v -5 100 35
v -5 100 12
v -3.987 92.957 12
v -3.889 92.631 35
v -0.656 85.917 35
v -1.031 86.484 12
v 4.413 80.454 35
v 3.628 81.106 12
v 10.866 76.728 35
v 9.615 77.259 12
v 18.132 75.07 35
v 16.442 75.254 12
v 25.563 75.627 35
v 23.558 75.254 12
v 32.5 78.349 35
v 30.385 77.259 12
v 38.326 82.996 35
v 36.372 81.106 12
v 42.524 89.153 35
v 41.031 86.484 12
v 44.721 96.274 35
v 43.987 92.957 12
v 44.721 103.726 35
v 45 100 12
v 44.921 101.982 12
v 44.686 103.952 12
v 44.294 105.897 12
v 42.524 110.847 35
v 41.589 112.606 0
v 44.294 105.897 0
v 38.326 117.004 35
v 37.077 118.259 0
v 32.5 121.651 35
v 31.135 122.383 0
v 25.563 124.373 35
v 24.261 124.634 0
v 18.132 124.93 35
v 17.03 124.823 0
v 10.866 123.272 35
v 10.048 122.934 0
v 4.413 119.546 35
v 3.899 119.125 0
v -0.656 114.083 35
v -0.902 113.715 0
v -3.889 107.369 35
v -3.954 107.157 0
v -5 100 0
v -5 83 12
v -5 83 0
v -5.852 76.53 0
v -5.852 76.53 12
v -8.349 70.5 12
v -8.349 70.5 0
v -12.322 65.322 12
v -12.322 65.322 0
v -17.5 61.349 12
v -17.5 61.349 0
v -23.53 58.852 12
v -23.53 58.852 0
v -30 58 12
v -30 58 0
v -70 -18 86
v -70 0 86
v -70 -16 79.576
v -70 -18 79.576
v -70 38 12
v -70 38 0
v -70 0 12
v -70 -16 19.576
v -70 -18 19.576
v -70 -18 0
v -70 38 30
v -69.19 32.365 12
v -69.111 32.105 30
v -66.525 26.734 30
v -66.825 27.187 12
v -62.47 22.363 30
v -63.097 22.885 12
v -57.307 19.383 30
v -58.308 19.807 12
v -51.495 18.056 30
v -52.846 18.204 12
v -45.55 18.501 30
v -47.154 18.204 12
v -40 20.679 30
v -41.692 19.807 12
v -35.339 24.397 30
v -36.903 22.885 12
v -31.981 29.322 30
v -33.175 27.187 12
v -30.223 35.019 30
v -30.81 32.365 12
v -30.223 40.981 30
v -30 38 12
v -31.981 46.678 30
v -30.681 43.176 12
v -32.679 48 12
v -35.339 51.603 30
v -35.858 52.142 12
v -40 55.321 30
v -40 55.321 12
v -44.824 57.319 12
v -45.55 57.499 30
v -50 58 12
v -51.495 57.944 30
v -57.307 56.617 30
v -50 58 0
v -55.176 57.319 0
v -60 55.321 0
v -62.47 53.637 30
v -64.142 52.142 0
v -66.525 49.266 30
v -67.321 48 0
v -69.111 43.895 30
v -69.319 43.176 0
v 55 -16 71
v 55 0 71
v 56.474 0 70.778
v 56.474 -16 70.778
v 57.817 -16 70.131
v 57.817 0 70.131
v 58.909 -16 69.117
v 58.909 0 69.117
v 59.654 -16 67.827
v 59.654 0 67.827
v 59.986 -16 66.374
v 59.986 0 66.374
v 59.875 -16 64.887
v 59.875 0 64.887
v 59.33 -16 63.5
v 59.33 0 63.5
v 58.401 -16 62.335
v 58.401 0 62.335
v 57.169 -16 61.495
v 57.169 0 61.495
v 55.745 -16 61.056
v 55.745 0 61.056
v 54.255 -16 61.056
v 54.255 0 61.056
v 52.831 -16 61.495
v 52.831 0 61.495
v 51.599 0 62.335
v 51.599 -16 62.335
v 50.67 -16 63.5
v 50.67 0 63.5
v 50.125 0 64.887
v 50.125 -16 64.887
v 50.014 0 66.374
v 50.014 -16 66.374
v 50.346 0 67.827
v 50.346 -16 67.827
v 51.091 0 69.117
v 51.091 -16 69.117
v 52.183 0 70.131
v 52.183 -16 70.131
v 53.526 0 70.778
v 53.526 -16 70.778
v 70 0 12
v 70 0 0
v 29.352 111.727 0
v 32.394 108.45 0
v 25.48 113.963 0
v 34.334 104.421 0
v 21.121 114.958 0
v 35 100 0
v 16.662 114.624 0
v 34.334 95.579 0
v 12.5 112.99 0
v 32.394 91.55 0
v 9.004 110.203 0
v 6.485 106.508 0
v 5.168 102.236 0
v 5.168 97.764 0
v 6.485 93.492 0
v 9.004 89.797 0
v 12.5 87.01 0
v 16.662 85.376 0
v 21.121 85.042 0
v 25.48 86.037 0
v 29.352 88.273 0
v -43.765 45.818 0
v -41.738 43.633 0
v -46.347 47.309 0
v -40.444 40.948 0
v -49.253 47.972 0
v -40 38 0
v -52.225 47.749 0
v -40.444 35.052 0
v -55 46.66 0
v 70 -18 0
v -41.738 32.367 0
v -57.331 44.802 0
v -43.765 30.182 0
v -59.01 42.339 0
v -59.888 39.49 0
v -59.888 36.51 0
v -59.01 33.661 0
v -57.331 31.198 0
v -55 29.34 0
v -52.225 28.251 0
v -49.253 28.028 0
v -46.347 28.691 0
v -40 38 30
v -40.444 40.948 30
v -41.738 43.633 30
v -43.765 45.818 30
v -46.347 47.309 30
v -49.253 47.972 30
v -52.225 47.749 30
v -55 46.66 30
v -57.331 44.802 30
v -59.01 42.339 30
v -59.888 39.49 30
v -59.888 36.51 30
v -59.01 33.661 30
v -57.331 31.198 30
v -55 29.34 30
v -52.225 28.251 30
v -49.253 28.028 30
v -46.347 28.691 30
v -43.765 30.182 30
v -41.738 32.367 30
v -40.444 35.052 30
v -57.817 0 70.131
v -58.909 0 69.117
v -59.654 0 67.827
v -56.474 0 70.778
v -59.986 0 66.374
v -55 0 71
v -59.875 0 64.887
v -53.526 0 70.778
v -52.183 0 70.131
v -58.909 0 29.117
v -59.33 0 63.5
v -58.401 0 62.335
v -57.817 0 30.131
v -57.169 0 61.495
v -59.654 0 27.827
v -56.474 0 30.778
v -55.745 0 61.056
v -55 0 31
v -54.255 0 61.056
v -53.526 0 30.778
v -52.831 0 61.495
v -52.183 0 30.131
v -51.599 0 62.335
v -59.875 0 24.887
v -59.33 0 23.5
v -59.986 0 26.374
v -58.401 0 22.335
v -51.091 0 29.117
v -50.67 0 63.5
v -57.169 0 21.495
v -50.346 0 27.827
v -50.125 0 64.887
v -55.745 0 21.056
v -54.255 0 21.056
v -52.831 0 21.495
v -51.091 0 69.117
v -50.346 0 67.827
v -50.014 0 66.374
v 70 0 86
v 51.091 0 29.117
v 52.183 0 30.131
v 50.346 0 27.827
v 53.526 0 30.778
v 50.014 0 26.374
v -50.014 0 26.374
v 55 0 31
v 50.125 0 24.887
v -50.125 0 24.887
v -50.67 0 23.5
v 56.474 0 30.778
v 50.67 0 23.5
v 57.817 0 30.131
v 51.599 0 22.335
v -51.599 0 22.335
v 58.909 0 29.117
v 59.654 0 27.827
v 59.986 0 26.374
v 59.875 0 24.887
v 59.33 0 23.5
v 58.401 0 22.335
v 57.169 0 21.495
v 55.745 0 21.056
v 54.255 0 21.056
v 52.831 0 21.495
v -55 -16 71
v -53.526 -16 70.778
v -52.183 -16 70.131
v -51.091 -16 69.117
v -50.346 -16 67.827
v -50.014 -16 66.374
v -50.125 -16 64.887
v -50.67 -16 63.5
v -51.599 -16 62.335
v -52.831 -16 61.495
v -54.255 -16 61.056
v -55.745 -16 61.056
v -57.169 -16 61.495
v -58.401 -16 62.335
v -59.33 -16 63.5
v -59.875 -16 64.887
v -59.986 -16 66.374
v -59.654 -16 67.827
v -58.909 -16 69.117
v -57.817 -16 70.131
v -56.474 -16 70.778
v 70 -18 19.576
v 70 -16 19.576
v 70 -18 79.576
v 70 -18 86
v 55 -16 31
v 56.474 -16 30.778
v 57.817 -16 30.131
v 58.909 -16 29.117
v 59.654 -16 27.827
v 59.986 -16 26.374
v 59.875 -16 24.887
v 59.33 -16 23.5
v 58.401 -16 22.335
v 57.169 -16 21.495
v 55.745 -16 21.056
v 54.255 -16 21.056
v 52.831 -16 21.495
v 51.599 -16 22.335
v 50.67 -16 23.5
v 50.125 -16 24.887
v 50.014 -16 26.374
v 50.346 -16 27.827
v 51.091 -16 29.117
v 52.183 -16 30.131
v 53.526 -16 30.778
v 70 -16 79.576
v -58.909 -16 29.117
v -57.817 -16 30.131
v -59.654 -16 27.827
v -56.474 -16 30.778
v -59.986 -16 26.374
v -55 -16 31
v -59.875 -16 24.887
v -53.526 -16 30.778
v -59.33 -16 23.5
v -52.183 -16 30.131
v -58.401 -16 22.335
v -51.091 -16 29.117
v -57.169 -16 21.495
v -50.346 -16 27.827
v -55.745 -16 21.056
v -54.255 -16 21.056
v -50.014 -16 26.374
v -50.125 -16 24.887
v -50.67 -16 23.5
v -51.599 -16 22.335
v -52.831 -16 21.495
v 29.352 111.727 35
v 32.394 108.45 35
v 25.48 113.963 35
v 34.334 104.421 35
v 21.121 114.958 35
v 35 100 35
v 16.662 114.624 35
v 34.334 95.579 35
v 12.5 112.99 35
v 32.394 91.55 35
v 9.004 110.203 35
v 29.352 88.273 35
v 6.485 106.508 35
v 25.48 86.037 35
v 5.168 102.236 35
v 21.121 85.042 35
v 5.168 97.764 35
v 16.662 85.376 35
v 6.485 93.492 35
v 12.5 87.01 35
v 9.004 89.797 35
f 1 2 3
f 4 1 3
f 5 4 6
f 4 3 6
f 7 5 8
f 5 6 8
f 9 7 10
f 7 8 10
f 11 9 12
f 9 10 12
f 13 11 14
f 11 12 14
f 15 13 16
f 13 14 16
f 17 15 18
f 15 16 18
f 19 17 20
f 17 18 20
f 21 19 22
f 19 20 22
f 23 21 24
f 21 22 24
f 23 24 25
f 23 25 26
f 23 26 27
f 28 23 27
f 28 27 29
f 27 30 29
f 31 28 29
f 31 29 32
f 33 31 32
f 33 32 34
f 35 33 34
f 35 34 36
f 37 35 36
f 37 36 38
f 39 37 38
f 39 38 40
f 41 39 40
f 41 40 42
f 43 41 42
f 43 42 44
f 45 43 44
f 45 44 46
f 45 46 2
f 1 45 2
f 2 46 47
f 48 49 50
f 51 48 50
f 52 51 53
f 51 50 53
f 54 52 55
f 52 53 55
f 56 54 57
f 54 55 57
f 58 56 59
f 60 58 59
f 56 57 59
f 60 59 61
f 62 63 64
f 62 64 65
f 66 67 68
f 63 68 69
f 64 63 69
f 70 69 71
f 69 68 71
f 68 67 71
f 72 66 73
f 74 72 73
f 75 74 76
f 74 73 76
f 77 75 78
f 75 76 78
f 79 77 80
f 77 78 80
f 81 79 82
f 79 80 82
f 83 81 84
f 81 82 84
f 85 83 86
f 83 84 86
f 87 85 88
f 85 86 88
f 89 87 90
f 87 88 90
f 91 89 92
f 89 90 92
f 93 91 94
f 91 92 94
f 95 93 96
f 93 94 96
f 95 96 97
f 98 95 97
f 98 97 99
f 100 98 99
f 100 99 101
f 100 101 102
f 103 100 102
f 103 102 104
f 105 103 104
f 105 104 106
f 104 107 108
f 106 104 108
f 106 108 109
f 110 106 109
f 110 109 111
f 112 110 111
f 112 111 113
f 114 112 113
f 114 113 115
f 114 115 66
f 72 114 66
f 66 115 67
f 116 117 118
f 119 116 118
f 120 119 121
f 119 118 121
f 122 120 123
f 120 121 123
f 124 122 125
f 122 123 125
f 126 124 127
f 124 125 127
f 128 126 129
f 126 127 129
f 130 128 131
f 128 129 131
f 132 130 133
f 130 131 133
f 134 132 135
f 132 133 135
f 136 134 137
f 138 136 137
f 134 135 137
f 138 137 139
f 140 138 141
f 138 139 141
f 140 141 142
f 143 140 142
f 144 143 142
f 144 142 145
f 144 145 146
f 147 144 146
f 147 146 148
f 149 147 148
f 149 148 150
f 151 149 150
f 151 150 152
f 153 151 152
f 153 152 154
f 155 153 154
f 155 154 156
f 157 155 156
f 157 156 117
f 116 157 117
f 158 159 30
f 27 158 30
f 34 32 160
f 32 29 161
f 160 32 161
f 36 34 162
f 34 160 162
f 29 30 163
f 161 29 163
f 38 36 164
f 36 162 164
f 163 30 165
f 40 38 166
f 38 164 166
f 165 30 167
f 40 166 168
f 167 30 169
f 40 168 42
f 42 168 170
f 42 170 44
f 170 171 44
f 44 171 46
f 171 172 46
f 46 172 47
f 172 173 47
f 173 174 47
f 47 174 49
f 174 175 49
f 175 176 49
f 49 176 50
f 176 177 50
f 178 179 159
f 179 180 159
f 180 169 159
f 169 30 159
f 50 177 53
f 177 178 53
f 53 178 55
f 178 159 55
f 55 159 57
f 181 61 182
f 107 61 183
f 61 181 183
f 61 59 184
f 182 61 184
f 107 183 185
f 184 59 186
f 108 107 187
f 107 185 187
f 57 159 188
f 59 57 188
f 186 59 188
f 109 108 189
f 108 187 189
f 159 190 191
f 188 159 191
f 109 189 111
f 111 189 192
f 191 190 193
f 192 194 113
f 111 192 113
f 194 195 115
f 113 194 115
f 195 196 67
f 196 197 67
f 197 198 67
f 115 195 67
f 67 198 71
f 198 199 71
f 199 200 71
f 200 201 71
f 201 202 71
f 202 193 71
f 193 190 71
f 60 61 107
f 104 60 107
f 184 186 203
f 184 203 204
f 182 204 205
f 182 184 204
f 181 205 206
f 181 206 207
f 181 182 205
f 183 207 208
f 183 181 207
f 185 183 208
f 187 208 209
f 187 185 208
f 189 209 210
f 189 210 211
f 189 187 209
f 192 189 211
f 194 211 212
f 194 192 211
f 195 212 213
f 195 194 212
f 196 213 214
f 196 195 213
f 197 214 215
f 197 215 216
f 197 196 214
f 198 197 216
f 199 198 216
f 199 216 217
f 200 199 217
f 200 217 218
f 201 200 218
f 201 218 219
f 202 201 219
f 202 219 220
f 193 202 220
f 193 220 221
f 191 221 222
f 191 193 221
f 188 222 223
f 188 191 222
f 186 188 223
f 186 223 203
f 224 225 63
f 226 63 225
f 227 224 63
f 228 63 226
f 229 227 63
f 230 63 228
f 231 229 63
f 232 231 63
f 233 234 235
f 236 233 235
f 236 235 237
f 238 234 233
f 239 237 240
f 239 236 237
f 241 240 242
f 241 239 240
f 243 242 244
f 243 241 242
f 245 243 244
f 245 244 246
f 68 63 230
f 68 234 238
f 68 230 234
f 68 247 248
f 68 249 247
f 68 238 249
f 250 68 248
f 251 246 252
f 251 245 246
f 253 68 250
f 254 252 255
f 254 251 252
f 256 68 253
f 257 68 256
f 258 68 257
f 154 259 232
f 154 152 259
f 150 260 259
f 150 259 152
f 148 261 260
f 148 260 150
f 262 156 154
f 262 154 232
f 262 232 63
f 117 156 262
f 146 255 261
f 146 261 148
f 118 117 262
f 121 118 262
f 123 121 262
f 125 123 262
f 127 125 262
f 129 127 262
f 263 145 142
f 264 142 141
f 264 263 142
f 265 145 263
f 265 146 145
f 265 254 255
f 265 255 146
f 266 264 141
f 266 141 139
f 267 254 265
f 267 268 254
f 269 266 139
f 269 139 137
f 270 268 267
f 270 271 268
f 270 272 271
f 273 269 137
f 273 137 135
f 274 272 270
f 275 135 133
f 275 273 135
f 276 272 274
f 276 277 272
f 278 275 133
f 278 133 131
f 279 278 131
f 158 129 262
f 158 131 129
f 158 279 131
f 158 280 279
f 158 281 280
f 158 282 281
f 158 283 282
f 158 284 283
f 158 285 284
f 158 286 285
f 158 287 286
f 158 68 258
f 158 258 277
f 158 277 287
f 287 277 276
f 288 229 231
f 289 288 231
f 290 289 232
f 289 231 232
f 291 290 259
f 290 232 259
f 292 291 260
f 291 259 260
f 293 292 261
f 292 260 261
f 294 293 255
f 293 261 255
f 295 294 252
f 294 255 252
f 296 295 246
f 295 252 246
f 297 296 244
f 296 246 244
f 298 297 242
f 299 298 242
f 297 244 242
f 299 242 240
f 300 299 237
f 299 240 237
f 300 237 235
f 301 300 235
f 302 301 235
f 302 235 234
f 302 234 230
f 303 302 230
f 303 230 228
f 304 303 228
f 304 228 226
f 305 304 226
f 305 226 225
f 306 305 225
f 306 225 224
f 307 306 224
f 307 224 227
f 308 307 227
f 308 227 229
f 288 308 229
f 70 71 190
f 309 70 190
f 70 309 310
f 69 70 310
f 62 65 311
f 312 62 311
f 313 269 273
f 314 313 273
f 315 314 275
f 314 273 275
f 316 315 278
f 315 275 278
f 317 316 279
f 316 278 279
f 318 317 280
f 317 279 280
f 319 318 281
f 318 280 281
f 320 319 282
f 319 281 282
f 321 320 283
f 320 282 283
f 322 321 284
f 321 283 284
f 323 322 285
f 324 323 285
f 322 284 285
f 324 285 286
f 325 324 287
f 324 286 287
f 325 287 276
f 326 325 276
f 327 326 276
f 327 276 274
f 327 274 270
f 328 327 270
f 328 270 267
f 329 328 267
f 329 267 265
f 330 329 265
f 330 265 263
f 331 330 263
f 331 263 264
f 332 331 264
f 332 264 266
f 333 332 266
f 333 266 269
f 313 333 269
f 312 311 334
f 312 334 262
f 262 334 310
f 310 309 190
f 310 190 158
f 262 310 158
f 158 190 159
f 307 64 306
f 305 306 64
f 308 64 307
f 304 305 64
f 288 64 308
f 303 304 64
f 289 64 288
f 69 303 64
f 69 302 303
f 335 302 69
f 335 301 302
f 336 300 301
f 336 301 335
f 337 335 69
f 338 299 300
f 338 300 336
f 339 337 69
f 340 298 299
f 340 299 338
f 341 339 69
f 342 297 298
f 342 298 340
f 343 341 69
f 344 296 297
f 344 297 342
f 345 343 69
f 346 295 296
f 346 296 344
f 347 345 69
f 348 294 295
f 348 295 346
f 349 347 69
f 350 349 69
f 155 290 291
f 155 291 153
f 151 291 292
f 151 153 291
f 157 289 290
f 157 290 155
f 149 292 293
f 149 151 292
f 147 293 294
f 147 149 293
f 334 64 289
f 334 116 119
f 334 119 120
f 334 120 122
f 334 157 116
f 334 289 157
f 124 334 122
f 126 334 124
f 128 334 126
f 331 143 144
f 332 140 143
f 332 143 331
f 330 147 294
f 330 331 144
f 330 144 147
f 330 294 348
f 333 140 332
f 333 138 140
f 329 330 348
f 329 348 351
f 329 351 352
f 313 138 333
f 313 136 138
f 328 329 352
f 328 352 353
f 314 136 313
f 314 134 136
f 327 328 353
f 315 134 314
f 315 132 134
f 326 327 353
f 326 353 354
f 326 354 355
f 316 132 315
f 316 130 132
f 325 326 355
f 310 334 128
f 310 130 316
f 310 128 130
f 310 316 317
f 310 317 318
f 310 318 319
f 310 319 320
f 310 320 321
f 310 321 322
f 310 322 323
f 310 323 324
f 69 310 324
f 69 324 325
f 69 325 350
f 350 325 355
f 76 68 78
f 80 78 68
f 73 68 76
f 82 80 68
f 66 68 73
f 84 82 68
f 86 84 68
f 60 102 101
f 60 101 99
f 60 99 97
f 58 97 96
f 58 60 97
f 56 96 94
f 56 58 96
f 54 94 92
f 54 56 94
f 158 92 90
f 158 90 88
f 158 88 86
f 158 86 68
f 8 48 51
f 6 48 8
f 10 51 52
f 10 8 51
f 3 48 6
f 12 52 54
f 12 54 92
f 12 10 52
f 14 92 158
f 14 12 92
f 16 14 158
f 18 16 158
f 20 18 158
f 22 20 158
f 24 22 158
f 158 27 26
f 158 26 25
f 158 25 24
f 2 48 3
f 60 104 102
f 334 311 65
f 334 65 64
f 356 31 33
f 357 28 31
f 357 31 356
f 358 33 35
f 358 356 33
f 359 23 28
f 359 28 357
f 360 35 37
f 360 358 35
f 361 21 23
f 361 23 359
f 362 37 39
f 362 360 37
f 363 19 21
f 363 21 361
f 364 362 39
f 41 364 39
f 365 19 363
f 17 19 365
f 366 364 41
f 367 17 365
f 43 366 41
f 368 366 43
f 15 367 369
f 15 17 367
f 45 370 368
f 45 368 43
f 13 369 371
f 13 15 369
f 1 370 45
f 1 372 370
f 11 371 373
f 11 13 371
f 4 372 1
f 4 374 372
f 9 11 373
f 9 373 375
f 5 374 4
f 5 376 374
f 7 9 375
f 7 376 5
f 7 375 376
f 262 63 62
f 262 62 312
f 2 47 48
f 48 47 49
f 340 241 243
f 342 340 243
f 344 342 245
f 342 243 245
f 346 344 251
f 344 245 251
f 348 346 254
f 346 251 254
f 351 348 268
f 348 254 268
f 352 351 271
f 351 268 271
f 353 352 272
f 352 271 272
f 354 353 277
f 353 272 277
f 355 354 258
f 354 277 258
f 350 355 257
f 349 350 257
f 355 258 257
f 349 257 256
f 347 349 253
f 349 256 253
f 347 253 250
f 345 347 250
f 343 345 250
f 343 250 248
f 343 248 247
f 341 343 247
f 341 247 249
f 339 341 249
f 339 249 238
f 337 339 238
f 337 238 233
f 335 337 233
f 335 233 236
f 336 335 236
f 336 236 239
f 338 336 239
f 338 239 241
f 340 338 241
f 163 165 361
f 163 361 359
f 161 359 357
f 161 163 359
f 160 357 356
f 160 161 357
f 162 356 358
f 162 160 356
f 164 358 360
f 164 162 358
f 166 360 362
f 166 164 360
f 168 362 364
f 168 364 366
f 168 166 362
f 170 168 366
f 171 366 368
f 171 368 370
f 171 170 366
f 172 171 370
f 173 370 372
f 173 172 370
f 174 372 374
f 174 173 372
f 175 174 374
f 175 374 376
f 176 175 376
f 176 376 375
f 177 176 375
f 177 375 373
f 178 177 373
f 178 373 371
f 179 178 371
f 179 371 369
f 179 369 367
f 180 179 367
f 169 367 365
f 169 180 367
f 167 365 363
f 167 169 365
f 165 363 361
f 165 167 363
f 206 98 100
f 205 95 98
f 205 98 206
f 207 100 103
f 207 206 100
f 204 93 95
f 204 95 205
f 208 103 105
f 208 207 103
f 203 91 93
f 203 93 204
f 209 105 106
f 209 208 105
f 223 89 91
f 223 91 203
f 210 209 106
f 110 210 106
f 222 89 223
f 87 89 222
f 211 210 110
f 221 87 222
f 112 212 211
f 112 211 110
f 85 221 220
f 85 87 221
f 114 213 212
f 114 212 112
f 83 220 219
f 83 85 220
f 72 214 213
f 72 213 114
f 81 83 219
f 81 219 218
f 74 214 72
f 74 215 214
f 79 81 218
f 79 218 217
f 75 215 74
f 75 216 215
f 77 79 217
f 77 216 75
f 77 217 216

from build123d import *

# Parameters (mm, degrees)
SKETCH4_W           = 140
SKETCH4_H           = 18
BOSS_EXTRUDE1_DEPTH = 86
BOSS_EXTRUDE3_DEPTH = 12
SKETCH6_5_R         = 15
BOSS_EXTRUDE4_DEPTH = 35
SKETCH6_6_R         = 10
BOSS_EXTRUDE5_DEPTH = 30
SKETCH11_R          = 5
CUT_EXTRUDE1_DEPTH  = 168.095780916
SKETCH12_W          = 60
SKETCH12_H          = 16.179667724
CUT_EXTRUDE2_DEPTH  = 207.448540804


with BuildPart() as part:
    # Sketch4 → Boss-Extrude1 (new body)
    with BuildSketch(Plane.XY):
        with Locations((0, -9)):
            Rectangle(SKETCH4_W, SKETCH4_H)
    extrude(amount=BOSS_EXTRUDE1_DEPTH)

    # Sketch6 → Boss-Extrude3 (add)
    with BuildSketch(Plane.XY):
        with BuildLine():
            Line((-70, 38), (-70, 0))
            Line((-70, 0), (70, 0))
            Line((70, 0), (44.294494718, 105.897247359))
            ThreePointArc((44.294494718, 105.897247359), (44.822997079, 102.969649142), (45, 100))
            ThreePointArc((45, 100), (20, 75), (-5, 100))
            Line((-5, 100), (-5, 83))
            ThreePointArc((-5, 83), (-12.32233047, 65.32233047), (-30, 58))
            Line((-30, 58), (-50, 58))
            ThreePointArc((-50, 58), (-35.857864376, 52.142135624), (-30, 38))
            ThreePointArc((-30, 38), (-50, 18), (-70, 38))
        make_face()
    extrude(amount=BOSS_EXTRUDE3_DEPTH)

    # Sketch6<5> → Boss-Extrude4 (add)
    with BuildSketch(Plane.XY):
        with BuildLine():
            ThreePointArc((45, 100), (44.822997079, 102.969649142), (44.294494718, 105.897247359))
            ThreePointArc((44.294494718, 105.897247359), (17.030350858, 124.822997079), (-5, 100))
            ThreePointArc((-5, 100), (20, 75), (45, 100))
        make_face()
        with Locations((20, 100)):
            Circle(SKETCH6_5_R, mode=Mode.SUBTRACT)
    extrude(amount=BOSS_EXTRUDE4_DEPTH)

    # Sketch6<6> → Boss-Extrude5 (add)
    with BuildSketch(Plane.XY):
        with BuildLine():
            ThreePointArc((-50, 58), (-64.142135624, 52.142135624), (-70, 38))
            ThreePointArc((-70, 38), (-50, 18), (-30, 38))
            ThreePointArc((-30, 38), (-35.857864376, 52.142135624), (-50, 58))
        make_face()
        with Locations((-50, 38)):
            Circle(SKETCH6_6_R, mode=Mode.SUBTRACT)
    extrude(amount=BOSS_EXTRUDE5_DEPTH)

    # Sketch11 → Cut-Extrude1 (cut, through all)
    with BuildSketch(Plane(origin=(0, 0, 0), x_dir=(1, 0, 0), z_dir=(0, 1, 0))):
        with Locations((-55, -66)):
            Circle(SKETCH11_R)
        with Locations((-55, -26)):
            Circle(SKETCH11_R)
        with Locations((55, -26)):
            Circle(SKETCH11_R)
        with Locations((55, -66)):
            Circle(SKETCH11_R)
    extrude(amount=-CUT_EXTRUDE1_DEPTH, mode=Mode.SUBTRACT)

    # Sketch12 → Cut-Extrude2 (cut, through all)
    with BuildSketch(Plane(origin=(70, 0, 0), x_dir=(0, 0, -1), z_dir=(1, 0, 0))):
        with Locations((-49.575704937, -24.089833862)):
            Rectangle(SKETCH12_W, SKETCH12_H)
    extrude(amount=-CUT_EXTRUDE2_DEPTH, mode=Mode.SUBTRACT)


solid = part.part
